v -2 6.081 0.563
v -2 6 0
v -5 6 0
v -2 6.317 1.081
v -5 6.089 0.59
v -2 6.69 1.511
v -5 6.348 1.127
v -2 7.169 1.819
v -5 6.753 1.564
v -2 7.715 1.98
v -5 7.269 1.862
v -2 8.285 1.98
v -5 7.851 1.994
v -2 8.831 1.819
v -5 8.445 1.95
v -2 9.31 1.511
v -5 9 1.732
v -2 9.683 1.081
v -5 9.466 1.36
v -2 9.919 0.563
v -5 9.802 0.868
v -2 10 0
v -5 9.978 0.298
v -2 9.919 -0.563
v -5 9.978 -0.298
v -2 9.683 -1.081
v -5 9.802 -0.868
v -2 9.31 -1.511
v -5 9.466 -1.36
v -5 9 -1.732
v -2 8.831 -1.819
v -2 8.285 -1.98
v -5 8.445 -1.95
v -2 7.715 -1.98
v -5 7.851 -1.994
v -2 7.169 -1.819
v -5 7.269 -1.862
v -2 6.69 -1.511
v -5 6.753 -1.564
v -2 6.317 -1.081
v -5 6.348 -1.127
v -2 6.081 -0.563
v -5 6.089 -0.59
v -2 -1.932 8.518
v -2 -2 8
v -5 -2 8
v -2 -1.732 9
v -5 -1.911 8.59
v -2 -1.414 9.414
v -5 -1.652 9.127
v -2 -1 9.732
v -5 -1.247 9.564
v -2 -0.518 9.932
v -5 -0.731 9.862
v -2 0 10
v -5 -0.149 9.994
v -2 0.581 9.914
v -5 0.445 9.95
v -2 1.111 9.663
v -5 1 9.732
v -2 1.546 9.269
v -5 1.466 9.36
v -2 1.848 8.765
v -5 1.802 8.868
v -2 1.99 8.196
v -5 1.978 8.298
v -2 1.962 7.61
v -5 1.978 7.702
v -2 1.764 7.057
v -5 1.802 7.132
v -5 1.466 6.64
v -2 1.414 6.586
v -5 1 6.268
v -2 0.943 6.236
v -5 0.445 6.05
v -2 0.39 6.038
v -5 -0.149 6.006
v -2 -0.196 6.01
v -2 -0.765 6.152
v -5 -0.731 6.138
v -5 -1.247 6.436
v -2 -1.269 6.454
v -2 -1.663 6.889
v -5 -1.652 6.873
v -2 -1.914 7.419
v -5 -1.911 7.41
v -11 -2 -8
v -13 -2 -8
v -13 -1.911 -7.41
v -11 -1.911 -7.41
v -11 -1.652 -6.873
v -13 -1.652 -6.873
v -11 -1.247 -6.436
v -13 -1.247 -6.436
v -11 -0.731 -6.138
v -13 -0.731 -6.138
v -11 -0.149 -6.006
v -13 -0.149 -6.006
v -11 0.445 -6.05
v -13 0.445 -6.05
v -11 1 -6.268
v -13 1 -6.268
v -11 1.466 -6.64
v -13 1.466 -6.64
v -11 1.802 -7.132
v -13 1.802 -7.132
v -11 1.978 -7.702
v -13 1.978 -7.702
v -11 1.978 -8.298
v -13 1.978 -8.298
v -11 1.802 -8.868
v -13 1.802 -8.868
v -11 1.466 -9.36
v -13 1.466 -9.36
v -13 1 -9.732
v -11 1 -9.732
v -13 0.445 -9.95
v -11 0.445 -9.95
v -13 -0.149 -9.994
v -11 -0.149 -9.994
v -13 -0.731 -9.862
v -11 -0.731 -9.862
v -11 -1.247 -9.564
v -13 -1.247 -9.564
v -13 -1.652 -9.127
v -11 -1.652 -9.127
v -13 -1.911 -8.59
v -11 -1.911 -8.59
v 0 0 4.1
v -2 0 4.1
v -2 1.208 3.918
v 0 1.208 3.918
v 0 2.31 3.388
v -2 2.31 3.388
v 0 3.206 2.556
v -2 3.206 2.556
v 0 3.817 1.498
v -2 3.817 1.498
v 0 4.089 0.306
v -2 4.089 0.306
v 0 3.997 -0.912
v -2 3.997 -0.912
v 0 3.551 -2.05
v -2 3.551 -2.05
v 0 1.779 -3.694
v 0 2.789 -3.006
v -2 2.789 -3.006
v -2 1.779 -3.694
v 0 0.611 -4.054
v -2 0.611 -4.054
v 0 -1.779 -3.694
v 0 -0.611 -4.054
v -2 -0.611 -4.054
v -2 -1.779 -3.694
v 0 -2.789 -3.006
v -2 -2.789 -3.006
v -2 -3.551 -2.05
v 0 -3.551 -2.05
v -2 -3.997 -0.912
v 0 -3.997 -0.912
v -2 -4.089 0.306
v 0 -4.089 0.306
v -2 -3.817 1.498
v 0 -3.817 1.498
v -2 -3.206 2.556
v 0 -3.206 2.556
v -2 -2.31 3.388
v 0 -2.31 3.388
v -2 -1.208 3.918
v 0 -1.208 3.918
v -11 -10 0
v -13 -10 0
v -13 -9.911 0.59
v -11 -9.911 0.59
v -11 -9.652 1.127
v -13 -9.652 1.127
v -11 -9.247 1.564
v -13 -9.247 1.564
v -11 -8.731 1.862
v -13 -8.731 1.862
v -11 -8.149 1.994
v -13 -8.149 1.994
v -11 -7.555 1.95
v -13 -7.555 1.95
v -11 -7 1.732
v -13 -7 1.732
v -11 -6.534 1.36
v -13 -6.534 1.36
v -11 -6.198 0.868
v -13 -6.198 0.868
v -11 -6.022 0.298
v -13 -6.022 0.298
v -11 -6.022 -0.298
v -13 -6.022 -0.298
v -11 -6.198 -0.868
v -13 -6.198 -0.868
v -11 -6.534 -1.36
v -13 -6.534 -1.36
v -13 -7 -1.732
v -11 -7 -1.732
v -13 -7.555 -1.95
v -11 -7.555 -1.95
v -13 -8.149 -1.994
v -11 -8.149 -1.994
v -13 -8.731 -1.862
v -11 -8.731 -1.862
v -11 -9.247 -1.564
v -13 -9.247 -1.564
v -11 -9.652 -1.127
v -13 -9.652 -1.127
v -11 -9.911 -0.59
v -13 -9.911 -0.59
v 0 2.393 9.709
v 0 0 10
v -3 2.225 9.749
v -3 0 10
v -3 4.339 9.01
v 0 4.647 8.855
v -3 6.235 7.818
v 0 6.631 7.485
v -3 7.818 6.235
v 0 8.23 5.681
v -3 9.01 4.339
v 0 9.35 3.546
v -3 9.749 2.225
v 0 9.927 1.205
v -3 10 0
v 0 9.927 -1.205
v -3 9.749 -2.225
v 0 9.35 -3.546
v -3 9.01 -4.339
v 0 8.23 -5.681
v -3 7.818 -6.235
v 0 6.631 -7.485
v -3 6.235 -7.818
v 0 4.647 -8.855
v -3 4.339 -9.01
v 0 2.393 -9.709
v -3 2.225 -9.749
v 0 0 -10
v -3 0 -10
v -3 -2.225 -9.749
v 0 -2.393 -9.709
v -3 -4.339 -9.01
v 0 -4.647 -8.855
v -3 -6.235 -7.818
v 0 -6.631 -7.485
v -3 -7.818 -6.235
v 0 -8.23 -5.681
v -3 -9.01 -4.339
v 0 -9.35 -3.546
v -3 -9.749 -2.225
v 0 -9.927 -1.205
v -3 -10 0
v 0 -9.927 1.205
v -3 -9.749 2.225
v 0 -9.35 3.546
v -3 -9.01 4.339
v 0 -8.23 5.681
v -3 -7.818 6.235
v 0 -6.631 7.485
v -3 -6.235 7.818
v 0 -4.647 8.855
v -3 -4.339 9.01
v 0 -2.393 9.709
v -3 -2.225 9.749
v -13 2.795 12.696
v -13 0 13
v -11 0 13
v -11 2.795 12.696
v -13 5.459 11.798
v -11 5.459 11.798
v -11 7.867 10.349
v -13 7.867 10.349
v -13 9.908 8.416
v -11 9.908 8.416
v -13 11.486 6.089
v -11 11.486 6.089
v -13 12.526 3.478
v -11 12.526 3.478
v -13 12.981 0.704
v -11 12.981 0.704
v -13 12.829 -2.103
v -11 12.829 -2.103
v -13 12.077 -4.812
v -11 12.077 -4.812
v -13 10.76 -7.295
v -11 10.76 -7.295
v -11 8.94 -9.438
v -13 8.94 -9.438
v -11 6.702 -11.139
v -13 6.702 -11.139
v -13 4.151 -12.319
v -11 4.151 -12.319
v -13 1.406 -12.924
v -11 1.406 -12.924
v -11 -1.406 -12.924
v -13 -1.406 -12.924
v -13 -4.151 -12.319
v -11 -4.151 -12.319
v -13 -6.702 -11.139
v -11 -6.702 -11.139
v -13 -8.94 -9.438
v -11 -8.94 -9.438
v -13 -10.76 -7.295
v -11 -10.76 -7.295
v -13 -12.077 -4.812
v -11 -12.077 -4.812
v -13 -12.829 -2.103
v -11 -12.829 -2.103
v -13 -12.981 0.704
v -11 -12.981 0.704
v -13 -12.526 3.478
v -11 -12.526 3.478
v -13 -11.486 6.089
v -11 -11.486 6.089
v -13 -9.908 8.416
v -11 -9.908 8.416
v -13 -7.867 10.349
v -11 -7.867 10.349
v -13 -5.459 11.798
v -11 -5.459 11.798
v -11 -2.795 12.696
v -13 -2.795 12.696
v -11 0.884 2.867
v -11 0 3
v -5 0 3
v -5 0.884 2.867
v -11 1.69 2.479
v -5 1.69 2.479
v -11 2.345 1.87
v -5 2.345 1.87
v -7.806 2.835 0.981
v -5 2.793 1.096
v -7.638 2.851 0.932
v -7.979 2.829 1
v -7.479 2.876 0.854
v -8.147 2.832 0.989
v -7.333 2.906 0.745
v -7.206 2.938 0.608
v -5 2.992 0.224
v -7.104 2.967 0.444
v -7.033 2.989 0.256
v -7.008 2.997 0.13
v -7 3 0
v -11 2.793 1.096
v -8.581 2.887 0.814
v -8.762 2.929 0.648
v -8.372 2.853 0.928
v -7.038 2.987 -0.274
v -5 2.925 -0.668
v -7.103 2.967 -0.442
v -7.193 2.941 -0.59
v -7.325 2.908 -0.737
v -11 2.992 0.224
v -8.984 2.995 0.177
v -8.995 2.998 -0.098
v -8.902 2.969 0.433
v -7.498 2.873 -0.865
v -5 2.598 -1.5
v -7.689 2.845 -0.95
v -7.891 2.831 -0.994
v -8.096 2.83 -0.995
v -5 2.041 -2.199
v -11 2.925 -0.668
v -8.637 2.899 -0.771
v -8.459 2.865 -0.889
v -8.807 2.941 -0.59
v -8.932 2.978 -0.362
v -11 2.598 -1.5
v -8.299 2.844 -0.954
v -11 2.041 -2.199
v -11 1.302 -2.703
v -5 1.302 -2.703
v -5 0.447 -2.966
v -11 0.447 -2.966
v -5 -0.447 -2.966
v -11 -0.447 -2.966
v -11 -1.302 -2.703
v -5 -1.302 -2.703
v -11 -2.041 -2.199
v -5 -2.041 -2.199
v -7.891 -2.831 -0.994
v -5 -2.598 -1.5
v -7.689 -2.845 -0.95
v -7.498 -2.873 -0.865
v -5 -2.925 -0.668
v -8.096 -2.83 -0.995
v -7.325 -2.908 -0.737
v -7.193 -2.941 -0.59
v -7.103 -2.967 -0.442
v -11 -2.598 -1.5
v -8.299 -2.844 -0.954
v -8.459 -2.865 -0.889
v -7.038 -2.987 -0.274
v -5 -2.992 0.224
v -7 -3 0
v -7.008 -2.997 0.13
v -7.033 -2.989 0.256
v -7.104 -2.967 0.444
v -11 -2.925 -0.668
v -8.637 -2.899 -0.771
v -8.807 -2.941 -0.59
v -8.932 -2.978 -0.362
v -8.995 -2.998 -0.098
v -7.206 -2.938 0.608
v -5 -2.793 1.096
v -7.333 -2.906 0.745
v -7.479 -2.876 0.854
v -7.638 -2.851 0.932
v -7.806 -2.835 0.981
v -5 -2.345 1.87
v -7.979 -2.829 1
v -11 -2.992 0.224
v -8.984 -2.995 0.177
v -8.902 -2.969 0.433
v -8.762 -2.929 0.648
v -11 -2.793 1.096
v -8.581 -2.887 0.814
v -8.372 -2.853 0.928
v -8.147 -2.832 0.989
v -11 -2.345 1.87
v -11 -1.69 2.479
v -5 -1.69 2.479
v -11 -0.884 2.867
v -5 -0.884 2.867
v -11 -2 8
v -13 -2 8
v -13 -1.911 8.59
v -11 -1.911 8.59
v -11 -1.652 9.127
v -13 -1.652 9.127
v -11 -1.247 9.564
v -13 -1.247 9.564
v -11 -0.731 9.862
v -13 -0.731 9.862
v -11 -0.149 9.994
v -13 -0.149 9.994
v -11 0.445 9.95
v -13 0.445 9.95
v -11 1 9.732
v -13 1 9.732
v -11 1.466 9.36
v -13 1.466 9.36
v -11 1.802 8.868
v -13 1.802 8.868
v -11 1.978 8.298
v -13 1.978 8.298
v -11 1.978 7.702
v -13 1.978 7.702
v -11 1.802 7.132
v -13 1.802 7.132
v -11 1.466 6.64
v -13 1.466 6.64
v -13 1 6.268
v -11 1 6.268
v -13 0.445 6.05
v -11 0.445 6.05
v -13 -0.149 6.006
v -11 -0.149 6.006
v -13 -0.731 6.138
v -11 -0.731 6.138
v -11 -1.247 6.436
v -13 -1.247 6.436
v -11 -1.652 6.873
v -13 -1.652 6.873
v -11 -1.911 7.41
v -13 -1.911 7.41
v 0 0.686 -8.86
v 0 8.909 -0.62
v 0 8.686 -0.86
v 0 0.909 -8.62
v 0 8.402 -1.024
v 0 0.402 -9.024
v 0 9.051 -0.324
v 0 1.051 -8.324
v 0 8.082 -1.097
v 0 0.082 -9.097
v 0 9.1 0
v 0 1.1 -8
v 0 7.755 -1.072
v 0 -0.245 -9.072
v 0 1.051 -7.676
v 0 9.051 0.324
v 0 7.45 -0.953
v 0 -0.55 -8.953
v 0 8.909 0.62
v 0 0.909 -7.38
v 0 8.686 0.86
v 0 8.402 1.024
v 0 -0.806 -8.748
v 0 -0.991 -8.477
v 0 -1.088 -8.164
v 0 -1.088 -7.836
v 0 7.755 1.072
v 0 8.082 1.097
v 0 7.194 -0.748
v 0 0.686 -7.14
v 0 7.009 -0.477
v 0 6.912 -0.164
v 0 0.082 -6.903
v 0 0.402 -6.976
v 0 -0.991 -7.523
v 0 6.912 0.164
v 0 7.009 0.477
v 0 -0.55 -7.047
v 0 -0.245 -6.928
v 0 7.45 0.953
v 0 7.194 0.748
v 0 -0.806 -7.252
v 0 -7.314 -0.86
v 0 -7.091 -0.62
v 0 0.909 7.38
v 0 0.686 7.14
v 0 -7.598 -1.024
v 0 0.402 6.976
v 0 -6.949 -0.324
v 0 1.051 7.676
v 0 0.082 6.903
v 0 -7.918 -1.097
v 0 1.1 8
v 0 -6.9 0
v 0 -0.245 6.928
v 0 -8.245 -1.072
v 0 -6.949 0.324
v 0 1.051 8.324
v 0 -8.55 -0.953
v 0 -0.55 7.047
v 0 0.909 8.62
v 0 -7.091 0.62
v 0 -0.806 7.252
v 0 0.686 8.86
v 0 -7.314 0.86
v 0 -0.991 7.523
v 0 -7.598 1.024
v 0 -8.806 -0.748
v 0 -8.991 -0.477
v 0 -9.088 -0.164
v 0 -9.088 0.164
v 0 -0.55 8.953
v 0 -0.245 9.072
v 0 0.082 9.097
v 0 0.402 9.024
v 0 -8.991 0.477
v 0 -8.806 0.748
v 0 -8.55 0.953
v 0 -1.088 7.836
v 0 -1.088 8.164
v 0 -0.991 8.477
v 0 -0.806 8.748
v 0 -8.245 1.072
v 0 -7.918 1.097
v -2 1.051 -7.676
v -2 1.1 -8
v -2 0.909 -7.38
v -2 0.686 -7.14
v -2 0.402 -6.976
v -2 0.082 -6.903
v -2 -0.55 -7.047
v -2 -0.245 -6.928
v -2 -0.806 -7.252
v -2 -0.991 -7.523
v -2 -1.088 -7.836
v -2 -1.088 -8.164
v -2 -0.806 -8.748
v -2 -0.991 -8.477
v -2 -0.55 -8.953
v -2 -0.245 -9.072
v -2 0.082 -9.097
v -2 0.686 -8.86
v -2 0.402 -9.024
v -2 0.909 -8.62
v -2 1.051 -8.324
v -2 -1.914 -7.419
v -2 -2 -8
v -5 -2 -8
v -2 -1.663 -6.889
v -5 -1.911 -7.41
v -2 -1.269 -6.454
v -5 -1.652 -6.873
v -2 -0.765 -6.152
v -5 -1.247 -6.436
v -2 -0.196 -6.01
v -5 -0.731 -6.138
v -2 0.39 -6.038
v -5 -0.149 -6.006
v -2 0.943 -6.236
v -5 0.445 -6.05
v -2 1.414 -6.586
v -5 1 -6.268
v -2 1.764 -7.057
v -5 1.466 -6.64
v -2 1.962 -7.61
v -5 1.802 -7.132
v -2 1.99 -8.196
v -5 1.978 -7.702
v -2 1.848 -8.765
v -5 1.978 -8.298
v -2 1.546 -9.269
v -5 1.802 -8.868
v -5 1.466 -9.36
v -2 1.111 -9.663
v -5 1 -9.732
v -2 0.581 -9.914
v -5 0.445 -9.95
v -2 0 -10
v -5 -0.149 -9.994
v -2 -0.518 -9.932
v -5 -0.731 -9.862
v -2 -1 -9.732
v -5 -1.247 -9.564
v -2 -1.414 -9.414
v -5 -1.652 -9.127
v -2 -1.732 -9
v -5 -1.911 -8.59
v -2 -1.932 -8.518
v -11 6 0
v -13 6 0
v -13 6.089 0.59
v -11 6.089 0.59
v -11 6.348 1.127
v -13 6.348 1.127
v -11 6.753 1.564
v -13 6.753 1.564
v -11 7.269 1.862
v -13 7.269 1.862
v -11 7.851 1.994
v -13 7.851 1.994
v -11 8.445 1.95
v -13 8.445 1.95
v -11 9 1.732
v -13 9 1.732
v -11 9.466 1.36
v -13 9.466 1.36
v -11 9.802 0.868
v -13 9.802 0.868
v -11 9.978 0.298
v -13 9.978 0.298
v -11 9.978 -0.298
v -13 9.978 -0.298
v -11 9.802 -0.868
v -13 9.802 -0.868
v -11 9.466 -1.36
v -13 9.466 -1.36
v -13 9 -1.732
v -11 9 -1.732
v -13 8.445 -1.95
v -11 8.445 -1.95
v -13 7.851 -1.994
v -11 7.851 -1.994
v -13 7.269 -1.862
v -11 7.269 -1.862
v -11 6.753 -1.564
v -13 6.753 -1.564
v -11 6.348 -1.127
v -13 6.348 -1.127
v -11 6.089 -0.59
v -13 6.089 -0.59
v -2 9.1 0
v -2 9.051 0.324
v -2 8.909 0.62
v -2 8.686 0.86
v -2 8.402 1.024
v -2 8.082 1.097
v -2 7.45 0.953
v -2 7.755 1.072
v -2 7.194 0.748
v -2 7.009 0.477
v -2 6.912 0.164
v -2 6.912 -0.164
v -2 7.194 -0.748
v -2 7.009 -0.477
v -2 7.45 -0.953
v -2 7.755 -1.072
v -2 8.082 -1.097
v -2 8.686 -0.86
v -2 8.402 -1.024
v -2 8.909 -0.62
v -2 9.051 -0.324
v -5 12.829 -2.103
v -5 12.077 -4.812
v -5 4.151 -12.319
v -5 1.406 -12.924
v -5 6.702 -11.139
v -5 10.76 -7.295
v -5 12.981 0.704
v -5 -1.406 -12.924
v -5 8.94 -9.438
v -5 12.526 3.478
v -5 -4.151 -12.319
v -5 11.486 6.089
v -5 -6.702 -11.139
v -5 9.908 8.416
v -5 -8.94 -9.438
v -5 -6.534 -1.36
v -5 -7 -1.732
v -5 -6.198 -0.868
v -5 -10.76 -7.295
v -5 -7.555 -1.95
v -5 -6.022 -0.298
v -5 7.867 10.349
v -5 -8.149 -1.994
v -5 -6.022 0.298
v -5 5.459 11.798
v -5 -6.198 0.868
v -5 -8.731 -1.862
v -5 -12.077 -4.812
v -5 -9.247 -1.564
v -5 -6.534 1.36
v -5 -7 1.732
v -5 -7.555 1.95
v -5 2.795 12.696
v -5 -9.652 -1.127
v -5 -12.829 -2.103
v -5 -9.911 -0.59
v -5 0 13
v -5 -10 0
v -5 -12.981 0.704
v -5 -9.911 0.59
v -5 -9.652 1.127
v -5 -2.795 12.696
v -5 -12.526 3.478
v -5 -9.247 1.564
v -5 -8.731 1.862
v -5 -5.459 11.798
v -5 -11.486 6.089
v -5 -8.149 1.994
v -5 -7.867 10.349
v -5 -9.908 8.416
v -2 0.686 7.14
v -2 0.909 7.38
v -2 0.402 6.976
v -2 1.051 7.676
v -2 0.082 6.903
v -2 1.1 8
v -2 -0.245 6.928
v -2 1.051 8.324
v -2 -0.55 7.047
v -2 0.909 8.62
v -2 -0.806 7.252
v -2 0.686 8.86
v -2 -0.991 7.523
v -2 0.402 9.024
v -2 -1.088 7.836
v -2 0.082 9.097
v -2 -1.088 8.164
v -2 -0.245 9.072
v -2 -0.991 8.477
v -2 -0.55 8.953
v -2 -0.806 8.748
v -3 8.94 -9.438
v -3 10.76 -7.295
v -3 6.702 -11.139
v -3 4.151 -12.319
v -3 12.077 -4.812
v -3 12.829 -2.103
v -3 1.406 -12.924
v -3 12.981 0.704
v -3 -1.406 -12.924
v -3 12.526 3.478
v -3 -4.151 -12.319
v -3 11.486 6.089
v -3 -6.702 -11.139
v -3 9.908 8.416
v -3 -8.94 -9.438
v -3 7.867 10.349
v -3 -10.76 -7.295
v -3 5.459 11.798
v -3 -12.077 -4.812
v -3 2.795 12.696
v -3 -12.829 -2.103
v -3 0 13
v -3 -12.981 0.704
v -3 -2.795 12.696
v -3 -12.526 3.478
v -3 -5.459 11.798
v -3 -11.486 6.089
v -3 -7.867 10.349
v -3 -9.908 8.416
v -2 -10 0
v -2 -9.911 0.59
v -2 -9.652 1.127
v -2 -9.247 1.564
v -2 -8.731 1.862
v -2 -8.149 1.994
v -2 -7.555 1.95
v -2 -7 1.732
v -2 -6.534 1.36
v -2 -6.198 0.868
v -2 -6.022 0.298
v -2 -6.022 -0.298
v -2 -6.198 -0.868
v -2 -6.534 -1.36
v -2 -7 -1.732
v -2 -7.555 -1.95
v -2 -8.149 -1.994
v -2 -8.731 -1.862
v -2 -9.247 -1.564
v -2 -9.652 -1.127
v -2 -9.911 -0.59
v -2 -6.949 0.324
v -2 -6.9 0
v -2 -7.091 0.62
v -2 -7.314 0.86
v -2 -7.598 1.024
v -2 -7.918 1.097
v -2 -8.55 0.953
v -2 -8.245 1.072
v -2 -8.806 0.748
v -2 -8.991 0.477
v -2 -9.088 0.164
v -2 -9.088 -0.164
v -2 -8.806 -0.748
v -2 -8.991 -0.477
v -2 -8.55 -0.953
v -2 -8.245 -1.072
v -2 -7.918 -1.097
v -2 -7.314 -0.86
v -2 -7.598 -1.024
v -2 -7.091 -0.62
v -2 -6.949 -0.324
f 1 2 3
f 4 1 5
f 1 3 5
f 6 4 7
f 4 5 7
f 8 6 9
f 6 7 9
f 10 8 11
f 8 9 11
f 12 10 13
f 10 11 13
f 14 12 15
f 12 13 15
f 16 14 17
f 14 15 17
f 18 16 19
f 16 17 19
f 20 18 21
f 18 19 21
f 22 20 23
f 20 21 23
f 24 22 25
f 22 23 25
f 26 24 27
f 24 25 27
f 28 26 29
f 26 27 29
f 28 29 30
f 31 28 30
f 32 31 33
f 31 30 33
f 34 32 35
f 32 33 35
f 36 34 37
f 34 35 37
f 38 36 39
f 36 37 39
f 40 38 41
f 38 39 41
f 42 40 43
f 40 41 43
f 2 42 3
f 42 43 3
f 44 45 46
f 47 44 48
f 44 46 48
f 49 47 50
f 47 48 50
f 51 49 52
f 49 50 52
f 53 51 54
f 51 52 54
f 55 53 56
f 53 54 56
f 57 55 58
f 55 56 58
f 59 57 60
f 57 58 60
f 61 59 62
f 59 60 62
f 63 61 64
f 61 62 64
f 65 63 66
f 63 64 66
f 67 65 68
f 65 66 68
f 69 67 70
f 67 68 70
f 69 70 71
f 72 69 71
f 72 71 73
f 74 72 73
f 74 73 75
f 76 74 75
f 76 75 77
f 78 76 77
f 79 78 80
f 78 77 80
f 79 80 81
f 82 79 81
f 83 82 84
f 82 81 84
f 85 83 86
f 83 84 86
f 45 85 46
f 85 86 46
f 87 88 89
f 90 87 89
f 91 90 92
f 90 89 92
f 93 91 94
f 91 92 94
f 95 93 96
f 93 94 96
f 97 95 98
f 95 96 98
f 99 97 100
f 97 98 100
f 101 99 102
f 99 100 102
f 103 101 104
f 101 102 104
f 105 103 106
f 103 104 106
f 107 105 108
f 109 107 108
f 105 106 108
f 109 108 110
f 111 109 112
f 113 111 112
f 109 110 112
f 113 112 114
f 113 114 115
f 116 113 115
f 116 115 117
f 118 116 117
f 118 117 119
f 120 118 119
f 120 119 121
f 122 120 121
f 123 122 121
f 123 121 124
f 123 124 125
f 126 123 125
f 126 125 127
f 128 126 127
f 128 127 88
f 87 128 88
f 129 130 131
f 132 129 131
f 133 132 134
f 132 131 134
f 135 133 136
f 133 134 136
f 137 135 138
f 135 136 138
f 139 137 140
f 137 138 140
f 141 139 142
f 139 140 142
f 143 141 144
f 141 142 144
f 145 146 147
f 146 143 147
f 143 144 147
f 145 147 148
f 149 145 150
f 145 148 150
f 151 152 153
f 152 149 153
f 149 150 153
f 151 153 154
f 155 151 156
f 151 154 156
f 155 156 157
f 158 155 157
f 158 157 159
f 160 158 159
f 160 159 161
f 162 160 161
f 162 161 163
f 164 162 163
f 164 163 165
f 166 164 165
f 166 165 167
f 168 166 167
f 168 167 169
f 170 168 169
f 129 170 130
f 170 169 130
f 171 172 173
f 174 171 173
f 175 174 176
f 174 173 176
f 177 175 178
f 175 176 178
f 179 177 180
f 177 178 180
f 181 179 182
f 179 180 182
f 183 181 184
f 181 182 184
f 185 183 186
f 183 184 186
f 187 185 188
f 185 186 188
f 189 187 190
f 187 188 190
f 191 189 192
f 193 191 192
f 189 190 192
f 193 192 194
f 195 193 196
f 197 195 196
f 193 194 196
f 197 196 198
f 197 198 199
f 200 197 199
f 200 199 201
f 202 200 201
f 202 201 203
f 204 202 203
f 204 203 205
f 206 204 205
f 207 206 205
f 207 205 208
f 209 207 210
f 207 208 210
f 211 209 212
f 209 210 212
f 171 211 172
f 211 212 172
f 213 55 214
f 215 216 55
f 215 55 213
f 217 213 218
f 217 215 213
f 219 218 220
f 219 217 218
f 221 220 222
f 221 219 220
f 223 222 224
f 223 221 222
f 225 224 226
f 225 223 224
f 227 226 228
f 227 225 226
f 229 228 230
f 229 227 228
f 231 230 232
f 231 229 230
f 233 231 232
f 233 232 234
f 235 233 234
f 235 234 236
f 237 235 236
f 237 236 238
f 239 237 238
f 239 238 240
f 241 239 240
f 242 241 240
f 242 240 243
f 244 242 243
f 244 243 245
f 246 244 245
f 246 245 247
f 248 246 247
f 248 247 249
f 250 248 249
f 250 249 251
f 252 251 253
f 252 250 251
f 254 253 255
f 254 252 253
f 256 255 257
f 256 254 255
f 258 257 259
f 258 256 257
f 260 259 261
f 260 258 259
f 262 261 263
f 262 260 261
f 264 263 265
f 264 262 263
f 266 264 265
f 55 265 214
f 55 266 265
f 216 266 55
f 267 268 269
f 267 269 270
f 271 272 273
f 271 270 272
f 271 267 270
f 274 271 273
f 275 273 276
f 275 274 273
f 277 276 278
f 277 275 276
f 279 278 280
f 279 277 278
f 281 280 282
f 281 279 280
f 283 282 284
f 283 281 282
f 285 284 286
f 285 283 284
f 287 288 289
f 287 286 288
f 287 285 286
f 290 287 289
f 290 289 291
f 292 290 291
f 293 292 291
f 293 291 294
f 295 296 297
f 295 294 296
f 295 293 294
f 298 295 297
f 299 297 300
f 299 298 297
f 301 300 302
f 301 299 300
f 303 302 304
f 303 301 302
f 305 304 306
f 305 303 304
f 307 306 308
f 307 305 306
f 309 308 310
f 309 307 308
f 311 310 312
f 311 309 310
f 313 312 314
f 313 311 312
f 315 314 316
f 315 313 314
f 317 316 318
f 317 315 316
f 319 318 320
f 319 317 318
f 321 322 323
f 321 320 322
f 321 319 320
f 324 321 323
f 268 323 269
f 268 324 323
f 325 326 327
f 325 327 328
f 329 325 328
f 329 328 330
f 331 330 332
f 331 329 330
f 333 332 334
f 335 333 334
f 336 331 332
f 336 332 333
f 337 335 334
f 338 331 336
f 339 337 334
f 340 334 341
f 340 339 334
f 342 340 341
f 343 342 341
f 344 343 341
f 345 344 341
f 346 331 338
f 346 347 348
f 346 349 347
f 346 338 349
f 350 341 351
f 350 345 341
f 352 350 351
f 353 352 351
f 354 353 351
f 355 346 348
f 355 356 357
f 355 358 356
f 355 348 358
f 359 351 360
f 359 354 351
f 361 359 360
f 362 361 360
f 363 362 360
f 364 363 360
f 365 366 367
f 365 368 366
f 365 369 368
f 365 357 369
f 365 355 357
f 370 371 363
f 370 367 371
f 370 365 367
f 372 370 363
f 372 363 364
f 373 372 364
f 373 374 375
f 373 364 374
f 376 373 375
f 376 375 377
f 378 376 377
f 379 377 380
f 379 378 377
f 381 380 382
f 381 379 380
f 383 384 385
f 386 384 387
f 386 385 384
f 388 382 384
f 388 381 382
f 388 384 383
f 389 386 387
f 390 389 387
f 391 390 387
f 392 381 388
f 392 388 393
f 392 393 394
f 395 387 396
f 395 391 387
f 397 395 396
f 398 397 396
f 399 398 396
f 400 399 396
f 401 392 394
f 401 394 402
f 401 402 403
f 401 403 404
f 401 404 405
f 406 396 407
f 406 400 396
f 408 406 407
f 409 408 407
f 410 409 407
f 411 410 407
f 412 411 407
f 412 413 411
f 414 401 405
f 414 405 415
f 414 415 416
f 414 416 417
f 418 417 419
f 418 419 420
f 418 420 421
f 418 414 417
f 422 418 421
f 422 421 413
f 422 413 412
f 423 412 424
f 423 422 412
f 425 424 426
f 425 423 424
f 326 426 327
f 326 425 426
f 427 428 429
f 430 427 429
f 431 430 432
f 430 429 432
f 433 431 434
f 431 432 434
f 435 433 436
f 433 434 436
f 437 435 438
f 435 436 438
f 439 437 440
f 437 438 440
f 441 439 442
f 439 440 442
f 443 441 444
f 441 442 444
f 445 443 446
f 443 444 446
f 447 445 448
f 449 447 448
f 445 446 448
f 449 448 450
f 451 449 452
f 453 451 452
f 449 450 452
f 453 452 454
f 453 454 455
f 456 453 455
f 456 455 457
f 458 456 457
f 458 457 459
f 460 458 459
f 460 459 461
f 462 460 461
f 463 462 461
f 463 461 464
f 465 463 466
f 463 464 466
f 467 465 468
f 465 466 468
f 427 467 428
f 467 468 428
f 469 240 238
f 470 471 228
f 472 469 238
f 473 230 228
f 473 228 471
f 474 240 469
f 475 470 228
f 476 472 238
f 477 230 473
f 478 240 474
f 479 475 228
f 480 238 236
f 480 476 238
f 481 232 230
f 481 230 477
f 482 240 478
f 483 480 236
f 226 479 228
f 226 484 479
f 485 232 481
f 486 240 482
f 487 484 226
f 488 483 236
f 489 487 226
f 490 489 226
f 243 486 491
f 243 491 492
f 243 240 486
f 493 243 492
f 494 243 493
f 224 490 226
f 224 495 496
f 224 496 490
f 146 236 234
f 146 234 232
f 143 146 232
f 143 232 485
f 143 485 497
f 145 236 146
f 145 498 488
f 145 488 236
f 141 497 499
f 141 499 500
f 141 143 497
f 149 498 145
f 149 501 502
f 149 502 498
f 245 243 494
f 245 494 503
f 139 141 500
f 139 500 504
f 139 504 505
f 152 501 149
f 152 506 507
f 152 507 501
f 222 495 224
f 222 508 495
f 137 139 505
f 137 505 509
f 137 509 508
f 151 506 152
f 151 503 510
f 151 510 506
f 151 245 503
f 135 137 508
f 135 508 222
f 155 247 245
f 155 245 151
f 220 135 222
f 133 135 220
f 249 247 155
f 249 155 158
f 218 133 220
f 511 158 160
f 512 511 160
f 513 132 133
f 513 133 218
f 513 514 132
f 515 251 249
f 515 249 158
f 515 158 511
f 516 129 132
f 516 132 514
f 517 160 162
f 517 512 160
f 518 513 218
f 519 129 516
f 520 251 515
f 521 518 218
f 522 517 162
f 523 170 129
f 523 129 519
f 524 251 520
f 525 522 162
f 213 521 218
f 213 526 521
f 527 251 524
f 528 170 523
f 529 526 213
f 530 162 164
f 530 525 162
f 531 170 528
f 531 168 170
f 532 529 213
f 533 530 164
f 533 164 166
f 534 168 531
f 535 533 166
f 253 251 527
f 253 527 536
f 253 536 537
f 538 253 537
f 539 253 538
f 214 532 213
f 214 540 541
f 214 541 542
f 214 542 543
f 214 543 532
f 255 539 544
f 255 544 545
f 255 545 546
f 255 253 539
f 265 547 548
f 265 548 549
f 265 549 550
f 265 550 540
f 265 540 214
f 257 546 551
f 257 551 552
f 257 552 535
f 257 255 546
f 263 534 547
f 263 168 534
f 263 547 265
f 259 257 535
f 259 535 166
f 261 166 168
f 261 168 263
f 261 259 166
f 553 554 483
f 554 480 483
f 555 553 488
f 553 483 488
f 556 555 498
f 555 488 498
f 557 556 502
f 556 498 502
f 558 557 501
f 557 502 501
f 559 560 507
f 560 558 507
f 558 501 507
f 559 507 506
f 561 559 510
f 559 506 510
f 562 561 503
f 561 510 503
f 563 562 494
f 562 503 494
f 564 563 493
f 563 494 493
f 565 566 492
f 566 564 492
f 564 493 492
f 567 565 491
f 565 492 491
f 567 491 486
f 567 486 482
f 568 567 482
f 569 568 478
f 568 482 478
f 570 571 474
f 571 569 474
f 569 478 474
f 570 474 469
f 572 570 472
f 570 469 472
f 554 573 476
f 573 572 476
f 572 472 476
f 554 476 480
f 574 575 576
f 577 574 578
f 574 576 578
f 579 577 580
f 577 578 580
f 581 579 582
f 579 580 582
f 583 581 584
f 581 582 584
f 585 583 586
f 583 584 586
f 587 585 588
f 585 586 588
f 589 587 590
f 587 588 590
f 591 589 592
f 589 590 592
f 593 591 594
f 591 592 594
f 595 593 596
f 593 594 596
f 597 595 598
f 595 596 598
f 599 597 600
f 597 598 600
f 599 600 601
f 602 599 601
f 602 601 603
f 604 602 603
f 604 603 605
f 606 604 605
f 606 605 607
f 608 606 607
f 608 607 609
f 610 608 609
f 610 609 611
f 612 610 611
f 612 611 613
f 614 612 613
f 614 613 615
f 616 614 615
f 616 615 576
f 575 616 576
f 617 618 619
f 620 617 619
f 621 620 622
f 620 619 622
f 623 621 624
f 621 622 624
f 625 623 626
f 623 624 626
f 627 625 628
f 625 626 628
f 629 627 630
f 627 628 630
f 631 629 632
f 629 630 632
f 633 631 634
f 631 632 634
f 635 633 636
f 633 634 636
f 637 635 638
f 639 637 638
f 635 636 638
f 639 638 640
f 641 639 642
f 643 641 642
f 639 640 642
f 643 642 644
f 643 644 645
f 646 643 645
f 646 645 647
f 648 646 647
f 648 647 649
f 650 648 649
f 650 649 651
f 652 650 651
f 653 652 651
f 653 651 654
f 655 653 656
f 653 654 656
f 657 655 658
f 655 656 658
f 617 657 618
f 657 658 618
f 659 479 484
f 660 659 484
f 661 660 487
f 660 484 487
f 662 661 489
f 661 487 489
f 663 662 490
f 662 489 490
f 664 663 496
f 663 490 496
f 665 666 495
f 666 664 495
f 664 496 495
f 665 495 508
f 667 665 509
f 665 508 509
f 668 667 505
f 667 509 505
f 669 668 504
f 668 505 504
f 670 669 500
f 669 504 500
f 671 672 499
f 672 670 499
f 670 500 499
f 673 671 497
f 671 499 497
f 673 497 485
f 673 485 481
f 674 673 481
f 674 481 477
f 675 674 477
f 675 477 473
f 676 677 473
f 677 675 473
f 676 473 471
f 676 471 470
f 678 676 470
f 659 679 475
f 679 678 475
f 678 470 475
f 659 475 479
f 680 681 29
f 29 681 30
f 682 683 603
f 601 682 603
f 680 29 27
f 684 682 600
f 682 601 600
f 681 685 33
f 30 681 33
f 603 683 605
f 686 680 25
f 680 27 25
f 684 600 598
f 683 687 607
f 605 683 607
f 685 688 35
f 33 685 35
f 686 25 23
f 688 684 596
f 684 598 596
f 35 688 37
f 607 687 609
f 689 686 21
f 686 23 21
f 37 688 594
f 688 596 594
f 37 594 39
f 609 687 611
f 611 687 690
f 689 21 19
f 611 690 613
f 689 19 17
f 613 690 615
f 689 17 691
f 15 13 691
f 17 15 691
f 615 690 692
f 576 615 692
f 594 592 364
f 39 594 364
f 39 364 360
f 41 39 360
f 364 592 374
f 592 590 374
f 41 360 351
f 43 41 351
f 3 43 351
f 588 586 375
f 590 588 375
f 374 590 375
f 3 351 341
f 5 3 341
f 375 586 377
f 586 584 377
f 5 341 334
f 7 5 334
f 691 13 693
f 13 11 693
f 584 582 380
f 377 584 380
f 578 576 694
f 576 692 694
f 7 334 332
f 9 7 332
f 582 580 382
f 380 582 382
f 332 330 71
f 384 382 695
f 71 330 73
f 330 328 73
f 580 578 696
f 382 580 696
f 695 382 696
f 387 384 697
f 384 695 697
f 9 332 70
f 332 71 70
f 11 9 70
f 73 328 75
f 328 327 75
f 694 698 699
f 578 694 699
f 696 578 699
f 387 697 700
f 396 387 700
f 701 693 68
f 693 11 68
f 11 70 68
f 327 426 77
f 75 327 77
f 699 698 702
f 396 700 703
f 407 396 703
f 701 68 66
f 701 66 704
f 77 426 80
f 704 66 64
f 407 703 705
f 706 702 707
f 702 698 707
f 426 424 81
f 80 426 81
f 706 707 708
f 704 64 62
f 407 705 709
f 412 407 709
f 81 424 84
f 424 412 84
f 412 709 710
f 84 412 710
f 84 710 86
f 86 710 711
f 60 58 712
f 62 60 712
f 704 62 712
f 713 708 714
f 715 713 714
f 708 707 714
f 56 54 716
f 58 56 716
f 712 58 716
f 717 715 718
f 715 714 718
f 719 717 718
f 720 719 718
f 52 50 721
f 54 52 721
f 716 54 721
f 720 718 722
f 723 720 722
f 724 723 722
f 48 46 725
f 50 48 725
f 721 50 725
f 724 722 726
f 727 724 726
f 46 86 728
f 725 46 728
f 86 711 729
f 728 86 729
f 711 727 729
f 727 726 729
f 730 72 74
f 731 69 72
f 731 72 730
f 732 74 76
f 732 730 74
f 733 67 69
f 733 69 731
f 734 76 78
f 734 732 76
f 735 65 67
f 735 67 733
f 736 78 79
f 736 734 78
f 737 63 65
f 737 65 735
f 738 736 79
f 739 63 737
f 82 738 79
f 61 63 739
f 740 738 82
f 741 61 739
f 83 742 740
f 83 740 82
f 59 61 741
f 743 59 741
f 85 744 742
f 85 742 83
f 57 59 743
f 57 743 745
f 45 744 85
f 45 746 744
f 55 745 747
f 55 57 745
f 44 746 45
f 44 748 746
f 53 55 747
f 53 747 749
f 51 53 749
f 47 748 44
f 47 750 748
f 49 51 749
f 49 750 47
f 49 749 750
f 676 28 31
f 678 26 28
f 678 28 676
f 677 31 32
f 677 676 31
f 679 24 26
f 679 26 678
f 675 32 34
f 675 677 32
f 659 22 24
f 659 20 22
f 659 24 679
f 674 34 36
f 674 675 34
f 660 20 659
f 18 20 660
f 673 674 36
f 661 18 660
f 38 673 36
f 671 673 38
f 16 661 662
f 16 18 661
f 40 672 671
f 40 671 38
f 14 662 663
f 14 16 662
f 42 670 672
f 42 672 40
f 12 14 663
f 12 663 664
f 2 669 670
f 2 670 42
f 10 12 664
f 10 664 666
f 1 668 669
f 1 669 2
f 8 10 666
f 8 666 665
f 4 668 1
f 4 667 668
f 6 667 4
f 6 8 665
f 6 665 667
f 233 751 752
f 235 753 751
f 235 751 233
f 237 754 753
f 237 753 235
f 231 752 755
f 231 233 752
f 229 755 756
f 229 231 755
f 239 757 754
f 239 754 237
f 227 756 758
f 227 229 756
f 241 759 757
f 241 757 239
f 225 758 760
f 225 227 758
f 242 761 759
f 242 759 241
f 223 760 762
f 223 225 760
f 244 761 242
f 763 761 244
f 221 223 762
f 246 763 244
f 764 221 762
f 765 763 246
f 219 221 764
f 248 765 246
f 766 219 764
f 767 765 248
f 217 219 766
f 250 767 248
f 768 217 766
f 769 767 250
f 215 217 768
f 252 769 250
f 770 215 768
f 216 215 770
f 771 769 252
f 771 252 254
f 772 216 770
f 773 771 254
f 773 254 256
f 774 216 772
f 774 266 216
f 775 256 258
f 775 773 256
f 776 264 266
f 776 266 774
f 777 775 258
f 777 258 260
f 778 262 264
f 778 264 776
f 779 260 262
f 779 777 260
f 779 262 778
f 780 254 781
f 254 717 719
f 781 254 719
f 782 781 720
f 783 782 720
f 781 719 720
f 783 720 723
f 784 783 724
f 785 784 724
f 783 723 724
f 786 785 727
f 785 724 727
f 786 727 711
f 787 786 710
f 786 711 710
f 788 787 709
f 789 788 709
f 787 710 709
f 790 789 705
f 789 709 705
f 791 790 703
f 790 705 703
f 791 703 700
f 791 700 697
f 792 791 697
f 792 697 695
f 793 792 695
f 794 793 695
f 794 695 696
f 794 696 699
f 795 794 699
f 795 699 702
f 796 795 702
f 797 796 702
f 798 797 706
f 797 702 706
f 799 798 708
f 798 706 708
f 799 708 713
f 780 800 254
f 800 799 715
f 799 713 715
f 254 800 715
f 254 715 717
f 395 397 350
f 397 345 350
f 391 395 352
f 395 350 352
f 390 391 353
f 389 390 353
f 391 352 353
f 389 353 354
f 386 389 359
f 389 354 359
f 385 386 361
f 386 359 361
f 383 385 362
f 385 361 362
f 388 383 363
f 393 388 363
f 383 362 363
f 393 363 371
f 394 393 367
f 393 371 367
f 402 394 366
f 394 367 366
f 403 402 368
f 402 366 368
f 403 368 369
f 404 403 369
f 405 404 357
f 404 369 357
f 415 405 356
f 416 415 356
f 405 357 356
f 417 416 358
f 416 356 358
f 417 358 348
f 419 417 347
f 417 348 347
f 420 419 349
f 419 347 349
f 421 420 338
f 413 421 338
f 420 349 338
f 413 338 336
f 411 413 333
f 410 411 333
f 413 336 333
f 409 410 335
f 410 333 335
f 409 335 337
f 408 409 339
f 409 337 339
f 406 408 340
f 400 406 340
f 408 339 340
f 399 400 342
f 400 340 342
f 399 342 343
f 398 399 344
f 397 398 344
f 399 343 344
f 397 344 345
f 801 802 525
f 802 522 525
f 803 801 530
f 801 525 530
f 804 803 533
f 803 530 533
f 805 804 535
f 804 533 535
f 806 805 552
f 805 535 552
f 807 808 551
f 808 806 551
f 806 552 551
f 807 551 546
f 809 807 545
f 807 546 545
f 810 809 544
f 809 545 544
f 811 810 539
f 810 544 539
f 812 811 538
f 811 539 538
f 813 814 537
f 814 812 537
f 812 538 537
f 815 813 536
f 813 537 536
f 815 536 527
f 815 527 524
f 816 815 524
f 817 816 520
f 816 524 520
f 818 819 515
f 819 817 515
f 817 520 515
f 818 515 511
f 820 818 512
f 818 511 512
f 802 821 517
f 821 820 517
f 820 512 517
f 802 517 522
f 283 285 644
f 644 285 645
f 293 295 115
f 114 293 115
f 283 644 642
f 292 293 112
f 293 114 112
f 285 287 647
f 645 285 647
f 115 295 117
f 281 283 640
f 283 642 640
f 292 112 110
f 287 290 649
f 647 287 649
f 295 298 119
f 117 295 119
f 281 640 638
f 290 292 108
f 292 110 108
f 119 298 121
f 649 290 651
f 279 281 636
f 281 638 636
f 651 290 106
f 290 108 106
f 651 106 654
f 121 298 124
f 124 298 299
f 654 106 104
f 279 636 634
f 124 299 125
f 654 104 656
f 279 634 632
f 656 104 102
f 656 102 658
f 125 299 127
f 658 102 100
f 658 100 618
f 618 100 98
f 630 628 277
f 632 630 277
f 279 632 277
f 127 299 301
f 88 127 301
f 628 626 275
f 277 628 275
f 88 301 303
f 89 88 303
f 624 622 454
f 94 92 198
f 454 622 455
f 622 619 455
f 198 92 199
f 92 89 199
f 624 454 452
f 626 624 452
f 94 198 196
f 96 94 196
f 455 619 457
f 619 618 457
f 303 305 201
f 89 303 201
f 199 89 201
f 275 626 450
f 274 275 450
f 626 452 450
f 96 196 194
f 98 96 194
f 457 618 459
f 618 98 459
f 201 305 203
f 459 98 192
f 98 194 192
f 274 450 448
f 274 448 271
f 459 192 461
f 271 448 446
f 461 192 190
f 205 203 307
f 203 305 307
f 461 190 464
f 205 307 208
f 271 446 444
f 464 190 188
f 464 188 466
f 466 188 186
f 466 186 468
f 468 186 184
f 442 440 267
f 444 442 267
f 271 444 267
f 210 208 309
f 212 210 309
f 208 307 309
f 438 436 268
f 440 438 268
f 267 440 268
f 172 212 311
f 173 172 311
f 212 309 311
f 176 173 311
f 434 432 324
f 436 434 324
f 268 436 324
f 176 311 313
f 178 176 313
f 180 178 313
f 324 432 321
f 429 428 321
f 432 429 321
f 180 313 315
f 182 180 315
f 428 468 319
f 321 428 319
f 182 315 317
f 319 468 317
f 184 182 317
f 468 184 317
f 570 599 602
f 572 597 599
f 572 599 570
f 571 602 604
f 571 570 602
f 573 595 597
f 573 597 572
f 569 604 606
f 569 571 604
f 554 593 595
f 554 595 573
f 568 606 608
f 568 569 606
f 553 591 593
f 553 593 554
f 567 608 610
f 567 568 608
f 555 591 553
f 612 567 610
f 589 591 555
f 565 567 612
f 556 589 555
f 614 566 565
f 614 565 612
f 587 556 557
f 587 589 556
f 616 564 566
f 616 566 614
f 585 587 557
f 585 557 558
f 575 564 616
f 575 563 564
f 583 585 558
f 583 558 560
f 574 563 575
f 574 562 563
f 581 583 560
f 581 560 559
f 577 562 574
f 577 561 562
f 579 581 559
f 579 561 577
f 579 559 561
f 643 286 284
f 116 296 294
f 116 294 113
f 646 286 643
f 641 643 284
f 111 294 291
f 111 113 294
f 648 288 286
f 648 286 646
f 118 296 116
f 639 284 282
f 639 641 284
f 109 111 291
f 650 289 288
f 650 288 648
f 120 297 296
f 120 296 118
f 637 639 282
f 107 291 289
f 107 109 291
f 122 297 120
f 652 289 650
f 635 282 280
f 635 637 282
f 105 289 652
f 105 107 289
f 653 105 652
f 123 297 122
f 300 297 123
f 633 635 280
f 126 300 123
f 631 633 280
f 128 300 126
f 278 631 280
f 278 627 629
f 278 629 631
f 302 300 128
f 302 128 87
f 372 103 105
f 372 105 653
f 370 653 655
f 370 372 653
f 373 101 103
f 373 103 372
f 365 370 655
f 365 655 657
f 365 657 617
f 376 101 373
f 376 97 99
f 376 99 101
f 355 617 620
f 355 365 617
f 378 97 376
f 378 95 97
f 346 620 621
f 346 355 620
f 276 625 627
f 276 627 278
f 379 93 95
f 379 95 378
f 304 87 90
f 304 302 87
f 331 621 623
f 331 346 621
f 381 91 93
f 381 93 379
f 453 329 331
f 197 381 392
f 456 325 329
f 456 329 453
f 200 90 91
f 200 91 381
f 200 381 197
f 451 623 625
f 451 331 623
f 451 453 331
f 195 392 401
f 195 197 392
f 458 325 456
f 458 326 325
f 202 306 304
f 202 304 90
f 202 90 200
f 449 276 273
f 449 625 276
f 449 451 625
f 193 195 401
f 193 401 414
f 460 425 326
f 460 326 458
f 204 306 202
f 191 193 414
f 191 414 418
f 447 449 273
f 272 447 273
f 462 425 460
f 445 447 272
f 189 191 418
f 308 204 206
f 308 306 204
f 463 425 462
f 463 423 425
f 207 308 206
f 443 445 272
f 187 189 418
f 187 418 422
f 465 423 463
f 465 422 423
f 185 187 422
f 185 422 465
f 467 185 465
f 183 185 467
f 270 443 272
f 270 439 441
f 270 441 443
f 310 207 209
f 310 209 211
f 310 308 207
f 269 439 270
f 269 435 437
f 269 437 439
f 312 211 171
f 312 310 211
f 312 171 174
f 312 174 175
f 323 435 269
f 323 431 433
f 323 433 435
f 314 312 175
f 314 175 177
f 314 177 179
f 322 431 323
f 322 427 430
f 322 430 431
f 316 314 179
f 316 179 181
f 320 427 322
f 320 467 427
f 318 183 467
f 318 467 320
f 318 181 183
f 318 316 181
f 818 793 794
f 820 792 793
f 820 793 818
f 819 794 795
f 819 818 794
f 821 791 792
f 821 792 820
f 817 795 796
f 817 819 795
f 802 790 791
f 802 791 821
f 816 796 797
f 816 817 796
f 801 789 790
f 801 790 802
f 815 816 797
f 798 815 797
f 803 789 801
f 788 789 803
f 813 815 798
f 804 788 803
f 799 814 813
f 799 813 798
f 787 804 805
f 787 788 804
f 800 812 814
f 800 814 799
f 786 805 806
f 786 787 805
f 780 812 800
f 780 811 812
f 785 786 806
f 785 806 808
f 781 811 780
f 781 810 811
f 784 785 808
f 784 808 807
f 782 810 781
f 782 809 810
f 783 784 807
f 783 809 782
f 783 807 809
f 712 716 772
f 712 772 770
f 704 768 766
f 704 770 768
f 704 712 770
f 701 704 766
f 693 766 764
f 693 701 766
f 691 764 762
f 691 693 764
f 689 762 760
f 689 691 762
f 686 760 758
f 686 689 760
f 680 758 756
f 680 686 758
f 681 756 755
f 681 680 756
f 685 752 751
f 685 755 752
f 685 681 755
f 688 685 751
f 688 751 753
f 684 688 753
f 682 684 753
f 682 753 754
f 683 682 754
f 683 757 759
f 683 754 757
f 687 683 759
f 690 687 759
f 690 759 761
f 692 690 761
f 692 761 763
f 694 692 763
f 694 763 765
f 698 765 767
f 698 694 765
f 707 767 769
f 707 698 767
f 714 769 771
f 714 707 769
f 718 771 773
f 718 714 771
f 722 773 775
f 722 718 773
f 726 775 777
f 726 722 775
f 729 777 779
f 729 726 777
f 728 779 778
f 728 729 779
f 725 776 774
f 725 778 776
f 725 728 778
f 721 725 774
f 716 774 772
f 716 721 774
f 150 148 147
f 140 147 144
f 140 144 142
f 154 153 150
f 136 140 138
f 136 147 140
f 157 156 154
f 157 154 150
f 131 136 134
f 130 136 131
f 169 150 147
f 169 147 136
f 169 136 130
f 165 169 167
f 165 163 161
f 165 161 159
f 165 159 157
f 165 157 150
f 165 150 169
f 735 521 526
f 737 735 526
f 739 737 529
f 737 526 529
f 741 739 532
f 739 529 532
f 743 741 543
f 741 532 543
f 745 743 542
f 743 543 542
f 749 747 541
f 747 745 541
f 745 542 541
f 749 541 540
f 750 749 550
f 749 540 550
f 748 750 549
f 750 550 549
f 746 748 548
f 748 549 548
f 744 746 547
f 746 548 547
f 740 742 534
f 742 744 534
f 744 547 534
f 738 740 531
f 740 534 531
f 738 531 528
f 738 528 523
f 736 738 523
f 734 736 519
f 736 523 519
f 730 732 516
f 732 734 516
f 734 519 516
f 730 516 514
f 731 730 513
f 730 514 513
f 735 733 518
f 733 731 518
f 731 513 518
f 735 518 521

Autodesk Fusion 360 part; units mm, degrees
sketch "Sketch1" plane through (0, 0, 0) normal (0, 1, 0) x (1, 0, 0)
  line L0 (0, 0) -> (0, -10)
  line L1 (0, -10) -> (-2, -10)
  line L2 (-3, -13) -> (-5, -13)
  line L3 (-5, -13) -> (-5, -3)
  line L4 (-5, -3) -> (-11, -3)
  line L5 (-11, -3) -> (-11, -13)
  line L6 (-11, -13) -> (-13, -13)
  line L7 (-13, -13) -> (-13, 0)
  line L8 (-13, 0) -> (0, 0)
  line L9 (0, 0) -> (0, -4.1)
  line L10 (0, -4.1) -> (-2, -4.1)
  line L11 (-2, -4.1) -> (-2, 0)
  line L12 (-2, -10) -> (-3, -10)
  line L13 (-3, -10) -> (-3, -13)
  dimension "d1" = 10
  dimension "d2" = 2
  dimension "d3" = 4.1
  dimension "d17" = 1
  dimension "d18" = 2
  dimension "d19" = 6
  dimension "d20" = 2
  dimension "d21" = 13
  dimension "d24" = 3
  dimension "d25" = 3
  dimension "d26" = 13
revolve "Revolve1" add sketch "Sketch1" angle 360 about axis through (1.75, 0, 0) along (1, 0, 0) contours L0 L1 L2 L3 L4 L5 L6 L7 L8 L10 L11 L12 L13
sketch "Sketch2" plane through (0, 0, 0) normal (1, 0, 0) x (0, 1, 0)
  circle A0 centre (0, 0) radius 4.1
  circle A1 centre (0, 0) radius 10
  circle A2 centre (0, 0) radius 8
  circle A3 centre (0, 8) radius 1.1
  circle A4 centre (-8, 0) radius 1.1
  circle A5 centre (8, 0) radius 1.1
  circle A6 centre (0, -8) radius 1.1
  dimension "d5" = 16
  dimension "d6" = 2.2
  dimension "d7" = 2.2
  dimension "d8" = 2.2
  dimension "d9" = 2.2
extrude "Extrude1" cut sketch "Sketch2" against normal blind 20 contours A2 A5 | A2 A5 | A2 A3 | A2 A3 | A2 A6 | A2 A6 | A2 A4 | A2 A4
sketch "Sketch3" plane through (-13, 0, 0) normal (-1, 0, 0) x (0, -1, 0)
  circle A0 centre (8, 0) radius 1.1
  circle A1 centre (-8, 0) radius 1.1
  circle A2 centre (0, 8) radius 1.1
  circle A3 centre (0, -8) radius 1.1
  circle A4 centre (0, 0) radius 13
  circle A5 centre (0, 8) radius 2
  circle A6 centre (8, 0) radius 2
  circle A7 centre (0, -8) radius 2
  circle A8 centre (-8, 0) radius 2
extrude "Extrude2" cut sketch "Sketch3" against normal blind 11 contours A5 | A6 | A7 | A8
sketch "Sketch4" plane through (0, 0, 0) normal (0, 1, 0) x (1, 0, 0)
  circle A0 centre (-8, 0) radius 1
  line L0 (-5, 13) -> (-5, -13)
  dimension "d14" = 2
  dimension "d22" = 3
extrude "Extrude3" cut sketch "Sketch4" along normal through all and the other way through all
equation "d3 = ( 8.2 / 2 ) * 1 mm"
